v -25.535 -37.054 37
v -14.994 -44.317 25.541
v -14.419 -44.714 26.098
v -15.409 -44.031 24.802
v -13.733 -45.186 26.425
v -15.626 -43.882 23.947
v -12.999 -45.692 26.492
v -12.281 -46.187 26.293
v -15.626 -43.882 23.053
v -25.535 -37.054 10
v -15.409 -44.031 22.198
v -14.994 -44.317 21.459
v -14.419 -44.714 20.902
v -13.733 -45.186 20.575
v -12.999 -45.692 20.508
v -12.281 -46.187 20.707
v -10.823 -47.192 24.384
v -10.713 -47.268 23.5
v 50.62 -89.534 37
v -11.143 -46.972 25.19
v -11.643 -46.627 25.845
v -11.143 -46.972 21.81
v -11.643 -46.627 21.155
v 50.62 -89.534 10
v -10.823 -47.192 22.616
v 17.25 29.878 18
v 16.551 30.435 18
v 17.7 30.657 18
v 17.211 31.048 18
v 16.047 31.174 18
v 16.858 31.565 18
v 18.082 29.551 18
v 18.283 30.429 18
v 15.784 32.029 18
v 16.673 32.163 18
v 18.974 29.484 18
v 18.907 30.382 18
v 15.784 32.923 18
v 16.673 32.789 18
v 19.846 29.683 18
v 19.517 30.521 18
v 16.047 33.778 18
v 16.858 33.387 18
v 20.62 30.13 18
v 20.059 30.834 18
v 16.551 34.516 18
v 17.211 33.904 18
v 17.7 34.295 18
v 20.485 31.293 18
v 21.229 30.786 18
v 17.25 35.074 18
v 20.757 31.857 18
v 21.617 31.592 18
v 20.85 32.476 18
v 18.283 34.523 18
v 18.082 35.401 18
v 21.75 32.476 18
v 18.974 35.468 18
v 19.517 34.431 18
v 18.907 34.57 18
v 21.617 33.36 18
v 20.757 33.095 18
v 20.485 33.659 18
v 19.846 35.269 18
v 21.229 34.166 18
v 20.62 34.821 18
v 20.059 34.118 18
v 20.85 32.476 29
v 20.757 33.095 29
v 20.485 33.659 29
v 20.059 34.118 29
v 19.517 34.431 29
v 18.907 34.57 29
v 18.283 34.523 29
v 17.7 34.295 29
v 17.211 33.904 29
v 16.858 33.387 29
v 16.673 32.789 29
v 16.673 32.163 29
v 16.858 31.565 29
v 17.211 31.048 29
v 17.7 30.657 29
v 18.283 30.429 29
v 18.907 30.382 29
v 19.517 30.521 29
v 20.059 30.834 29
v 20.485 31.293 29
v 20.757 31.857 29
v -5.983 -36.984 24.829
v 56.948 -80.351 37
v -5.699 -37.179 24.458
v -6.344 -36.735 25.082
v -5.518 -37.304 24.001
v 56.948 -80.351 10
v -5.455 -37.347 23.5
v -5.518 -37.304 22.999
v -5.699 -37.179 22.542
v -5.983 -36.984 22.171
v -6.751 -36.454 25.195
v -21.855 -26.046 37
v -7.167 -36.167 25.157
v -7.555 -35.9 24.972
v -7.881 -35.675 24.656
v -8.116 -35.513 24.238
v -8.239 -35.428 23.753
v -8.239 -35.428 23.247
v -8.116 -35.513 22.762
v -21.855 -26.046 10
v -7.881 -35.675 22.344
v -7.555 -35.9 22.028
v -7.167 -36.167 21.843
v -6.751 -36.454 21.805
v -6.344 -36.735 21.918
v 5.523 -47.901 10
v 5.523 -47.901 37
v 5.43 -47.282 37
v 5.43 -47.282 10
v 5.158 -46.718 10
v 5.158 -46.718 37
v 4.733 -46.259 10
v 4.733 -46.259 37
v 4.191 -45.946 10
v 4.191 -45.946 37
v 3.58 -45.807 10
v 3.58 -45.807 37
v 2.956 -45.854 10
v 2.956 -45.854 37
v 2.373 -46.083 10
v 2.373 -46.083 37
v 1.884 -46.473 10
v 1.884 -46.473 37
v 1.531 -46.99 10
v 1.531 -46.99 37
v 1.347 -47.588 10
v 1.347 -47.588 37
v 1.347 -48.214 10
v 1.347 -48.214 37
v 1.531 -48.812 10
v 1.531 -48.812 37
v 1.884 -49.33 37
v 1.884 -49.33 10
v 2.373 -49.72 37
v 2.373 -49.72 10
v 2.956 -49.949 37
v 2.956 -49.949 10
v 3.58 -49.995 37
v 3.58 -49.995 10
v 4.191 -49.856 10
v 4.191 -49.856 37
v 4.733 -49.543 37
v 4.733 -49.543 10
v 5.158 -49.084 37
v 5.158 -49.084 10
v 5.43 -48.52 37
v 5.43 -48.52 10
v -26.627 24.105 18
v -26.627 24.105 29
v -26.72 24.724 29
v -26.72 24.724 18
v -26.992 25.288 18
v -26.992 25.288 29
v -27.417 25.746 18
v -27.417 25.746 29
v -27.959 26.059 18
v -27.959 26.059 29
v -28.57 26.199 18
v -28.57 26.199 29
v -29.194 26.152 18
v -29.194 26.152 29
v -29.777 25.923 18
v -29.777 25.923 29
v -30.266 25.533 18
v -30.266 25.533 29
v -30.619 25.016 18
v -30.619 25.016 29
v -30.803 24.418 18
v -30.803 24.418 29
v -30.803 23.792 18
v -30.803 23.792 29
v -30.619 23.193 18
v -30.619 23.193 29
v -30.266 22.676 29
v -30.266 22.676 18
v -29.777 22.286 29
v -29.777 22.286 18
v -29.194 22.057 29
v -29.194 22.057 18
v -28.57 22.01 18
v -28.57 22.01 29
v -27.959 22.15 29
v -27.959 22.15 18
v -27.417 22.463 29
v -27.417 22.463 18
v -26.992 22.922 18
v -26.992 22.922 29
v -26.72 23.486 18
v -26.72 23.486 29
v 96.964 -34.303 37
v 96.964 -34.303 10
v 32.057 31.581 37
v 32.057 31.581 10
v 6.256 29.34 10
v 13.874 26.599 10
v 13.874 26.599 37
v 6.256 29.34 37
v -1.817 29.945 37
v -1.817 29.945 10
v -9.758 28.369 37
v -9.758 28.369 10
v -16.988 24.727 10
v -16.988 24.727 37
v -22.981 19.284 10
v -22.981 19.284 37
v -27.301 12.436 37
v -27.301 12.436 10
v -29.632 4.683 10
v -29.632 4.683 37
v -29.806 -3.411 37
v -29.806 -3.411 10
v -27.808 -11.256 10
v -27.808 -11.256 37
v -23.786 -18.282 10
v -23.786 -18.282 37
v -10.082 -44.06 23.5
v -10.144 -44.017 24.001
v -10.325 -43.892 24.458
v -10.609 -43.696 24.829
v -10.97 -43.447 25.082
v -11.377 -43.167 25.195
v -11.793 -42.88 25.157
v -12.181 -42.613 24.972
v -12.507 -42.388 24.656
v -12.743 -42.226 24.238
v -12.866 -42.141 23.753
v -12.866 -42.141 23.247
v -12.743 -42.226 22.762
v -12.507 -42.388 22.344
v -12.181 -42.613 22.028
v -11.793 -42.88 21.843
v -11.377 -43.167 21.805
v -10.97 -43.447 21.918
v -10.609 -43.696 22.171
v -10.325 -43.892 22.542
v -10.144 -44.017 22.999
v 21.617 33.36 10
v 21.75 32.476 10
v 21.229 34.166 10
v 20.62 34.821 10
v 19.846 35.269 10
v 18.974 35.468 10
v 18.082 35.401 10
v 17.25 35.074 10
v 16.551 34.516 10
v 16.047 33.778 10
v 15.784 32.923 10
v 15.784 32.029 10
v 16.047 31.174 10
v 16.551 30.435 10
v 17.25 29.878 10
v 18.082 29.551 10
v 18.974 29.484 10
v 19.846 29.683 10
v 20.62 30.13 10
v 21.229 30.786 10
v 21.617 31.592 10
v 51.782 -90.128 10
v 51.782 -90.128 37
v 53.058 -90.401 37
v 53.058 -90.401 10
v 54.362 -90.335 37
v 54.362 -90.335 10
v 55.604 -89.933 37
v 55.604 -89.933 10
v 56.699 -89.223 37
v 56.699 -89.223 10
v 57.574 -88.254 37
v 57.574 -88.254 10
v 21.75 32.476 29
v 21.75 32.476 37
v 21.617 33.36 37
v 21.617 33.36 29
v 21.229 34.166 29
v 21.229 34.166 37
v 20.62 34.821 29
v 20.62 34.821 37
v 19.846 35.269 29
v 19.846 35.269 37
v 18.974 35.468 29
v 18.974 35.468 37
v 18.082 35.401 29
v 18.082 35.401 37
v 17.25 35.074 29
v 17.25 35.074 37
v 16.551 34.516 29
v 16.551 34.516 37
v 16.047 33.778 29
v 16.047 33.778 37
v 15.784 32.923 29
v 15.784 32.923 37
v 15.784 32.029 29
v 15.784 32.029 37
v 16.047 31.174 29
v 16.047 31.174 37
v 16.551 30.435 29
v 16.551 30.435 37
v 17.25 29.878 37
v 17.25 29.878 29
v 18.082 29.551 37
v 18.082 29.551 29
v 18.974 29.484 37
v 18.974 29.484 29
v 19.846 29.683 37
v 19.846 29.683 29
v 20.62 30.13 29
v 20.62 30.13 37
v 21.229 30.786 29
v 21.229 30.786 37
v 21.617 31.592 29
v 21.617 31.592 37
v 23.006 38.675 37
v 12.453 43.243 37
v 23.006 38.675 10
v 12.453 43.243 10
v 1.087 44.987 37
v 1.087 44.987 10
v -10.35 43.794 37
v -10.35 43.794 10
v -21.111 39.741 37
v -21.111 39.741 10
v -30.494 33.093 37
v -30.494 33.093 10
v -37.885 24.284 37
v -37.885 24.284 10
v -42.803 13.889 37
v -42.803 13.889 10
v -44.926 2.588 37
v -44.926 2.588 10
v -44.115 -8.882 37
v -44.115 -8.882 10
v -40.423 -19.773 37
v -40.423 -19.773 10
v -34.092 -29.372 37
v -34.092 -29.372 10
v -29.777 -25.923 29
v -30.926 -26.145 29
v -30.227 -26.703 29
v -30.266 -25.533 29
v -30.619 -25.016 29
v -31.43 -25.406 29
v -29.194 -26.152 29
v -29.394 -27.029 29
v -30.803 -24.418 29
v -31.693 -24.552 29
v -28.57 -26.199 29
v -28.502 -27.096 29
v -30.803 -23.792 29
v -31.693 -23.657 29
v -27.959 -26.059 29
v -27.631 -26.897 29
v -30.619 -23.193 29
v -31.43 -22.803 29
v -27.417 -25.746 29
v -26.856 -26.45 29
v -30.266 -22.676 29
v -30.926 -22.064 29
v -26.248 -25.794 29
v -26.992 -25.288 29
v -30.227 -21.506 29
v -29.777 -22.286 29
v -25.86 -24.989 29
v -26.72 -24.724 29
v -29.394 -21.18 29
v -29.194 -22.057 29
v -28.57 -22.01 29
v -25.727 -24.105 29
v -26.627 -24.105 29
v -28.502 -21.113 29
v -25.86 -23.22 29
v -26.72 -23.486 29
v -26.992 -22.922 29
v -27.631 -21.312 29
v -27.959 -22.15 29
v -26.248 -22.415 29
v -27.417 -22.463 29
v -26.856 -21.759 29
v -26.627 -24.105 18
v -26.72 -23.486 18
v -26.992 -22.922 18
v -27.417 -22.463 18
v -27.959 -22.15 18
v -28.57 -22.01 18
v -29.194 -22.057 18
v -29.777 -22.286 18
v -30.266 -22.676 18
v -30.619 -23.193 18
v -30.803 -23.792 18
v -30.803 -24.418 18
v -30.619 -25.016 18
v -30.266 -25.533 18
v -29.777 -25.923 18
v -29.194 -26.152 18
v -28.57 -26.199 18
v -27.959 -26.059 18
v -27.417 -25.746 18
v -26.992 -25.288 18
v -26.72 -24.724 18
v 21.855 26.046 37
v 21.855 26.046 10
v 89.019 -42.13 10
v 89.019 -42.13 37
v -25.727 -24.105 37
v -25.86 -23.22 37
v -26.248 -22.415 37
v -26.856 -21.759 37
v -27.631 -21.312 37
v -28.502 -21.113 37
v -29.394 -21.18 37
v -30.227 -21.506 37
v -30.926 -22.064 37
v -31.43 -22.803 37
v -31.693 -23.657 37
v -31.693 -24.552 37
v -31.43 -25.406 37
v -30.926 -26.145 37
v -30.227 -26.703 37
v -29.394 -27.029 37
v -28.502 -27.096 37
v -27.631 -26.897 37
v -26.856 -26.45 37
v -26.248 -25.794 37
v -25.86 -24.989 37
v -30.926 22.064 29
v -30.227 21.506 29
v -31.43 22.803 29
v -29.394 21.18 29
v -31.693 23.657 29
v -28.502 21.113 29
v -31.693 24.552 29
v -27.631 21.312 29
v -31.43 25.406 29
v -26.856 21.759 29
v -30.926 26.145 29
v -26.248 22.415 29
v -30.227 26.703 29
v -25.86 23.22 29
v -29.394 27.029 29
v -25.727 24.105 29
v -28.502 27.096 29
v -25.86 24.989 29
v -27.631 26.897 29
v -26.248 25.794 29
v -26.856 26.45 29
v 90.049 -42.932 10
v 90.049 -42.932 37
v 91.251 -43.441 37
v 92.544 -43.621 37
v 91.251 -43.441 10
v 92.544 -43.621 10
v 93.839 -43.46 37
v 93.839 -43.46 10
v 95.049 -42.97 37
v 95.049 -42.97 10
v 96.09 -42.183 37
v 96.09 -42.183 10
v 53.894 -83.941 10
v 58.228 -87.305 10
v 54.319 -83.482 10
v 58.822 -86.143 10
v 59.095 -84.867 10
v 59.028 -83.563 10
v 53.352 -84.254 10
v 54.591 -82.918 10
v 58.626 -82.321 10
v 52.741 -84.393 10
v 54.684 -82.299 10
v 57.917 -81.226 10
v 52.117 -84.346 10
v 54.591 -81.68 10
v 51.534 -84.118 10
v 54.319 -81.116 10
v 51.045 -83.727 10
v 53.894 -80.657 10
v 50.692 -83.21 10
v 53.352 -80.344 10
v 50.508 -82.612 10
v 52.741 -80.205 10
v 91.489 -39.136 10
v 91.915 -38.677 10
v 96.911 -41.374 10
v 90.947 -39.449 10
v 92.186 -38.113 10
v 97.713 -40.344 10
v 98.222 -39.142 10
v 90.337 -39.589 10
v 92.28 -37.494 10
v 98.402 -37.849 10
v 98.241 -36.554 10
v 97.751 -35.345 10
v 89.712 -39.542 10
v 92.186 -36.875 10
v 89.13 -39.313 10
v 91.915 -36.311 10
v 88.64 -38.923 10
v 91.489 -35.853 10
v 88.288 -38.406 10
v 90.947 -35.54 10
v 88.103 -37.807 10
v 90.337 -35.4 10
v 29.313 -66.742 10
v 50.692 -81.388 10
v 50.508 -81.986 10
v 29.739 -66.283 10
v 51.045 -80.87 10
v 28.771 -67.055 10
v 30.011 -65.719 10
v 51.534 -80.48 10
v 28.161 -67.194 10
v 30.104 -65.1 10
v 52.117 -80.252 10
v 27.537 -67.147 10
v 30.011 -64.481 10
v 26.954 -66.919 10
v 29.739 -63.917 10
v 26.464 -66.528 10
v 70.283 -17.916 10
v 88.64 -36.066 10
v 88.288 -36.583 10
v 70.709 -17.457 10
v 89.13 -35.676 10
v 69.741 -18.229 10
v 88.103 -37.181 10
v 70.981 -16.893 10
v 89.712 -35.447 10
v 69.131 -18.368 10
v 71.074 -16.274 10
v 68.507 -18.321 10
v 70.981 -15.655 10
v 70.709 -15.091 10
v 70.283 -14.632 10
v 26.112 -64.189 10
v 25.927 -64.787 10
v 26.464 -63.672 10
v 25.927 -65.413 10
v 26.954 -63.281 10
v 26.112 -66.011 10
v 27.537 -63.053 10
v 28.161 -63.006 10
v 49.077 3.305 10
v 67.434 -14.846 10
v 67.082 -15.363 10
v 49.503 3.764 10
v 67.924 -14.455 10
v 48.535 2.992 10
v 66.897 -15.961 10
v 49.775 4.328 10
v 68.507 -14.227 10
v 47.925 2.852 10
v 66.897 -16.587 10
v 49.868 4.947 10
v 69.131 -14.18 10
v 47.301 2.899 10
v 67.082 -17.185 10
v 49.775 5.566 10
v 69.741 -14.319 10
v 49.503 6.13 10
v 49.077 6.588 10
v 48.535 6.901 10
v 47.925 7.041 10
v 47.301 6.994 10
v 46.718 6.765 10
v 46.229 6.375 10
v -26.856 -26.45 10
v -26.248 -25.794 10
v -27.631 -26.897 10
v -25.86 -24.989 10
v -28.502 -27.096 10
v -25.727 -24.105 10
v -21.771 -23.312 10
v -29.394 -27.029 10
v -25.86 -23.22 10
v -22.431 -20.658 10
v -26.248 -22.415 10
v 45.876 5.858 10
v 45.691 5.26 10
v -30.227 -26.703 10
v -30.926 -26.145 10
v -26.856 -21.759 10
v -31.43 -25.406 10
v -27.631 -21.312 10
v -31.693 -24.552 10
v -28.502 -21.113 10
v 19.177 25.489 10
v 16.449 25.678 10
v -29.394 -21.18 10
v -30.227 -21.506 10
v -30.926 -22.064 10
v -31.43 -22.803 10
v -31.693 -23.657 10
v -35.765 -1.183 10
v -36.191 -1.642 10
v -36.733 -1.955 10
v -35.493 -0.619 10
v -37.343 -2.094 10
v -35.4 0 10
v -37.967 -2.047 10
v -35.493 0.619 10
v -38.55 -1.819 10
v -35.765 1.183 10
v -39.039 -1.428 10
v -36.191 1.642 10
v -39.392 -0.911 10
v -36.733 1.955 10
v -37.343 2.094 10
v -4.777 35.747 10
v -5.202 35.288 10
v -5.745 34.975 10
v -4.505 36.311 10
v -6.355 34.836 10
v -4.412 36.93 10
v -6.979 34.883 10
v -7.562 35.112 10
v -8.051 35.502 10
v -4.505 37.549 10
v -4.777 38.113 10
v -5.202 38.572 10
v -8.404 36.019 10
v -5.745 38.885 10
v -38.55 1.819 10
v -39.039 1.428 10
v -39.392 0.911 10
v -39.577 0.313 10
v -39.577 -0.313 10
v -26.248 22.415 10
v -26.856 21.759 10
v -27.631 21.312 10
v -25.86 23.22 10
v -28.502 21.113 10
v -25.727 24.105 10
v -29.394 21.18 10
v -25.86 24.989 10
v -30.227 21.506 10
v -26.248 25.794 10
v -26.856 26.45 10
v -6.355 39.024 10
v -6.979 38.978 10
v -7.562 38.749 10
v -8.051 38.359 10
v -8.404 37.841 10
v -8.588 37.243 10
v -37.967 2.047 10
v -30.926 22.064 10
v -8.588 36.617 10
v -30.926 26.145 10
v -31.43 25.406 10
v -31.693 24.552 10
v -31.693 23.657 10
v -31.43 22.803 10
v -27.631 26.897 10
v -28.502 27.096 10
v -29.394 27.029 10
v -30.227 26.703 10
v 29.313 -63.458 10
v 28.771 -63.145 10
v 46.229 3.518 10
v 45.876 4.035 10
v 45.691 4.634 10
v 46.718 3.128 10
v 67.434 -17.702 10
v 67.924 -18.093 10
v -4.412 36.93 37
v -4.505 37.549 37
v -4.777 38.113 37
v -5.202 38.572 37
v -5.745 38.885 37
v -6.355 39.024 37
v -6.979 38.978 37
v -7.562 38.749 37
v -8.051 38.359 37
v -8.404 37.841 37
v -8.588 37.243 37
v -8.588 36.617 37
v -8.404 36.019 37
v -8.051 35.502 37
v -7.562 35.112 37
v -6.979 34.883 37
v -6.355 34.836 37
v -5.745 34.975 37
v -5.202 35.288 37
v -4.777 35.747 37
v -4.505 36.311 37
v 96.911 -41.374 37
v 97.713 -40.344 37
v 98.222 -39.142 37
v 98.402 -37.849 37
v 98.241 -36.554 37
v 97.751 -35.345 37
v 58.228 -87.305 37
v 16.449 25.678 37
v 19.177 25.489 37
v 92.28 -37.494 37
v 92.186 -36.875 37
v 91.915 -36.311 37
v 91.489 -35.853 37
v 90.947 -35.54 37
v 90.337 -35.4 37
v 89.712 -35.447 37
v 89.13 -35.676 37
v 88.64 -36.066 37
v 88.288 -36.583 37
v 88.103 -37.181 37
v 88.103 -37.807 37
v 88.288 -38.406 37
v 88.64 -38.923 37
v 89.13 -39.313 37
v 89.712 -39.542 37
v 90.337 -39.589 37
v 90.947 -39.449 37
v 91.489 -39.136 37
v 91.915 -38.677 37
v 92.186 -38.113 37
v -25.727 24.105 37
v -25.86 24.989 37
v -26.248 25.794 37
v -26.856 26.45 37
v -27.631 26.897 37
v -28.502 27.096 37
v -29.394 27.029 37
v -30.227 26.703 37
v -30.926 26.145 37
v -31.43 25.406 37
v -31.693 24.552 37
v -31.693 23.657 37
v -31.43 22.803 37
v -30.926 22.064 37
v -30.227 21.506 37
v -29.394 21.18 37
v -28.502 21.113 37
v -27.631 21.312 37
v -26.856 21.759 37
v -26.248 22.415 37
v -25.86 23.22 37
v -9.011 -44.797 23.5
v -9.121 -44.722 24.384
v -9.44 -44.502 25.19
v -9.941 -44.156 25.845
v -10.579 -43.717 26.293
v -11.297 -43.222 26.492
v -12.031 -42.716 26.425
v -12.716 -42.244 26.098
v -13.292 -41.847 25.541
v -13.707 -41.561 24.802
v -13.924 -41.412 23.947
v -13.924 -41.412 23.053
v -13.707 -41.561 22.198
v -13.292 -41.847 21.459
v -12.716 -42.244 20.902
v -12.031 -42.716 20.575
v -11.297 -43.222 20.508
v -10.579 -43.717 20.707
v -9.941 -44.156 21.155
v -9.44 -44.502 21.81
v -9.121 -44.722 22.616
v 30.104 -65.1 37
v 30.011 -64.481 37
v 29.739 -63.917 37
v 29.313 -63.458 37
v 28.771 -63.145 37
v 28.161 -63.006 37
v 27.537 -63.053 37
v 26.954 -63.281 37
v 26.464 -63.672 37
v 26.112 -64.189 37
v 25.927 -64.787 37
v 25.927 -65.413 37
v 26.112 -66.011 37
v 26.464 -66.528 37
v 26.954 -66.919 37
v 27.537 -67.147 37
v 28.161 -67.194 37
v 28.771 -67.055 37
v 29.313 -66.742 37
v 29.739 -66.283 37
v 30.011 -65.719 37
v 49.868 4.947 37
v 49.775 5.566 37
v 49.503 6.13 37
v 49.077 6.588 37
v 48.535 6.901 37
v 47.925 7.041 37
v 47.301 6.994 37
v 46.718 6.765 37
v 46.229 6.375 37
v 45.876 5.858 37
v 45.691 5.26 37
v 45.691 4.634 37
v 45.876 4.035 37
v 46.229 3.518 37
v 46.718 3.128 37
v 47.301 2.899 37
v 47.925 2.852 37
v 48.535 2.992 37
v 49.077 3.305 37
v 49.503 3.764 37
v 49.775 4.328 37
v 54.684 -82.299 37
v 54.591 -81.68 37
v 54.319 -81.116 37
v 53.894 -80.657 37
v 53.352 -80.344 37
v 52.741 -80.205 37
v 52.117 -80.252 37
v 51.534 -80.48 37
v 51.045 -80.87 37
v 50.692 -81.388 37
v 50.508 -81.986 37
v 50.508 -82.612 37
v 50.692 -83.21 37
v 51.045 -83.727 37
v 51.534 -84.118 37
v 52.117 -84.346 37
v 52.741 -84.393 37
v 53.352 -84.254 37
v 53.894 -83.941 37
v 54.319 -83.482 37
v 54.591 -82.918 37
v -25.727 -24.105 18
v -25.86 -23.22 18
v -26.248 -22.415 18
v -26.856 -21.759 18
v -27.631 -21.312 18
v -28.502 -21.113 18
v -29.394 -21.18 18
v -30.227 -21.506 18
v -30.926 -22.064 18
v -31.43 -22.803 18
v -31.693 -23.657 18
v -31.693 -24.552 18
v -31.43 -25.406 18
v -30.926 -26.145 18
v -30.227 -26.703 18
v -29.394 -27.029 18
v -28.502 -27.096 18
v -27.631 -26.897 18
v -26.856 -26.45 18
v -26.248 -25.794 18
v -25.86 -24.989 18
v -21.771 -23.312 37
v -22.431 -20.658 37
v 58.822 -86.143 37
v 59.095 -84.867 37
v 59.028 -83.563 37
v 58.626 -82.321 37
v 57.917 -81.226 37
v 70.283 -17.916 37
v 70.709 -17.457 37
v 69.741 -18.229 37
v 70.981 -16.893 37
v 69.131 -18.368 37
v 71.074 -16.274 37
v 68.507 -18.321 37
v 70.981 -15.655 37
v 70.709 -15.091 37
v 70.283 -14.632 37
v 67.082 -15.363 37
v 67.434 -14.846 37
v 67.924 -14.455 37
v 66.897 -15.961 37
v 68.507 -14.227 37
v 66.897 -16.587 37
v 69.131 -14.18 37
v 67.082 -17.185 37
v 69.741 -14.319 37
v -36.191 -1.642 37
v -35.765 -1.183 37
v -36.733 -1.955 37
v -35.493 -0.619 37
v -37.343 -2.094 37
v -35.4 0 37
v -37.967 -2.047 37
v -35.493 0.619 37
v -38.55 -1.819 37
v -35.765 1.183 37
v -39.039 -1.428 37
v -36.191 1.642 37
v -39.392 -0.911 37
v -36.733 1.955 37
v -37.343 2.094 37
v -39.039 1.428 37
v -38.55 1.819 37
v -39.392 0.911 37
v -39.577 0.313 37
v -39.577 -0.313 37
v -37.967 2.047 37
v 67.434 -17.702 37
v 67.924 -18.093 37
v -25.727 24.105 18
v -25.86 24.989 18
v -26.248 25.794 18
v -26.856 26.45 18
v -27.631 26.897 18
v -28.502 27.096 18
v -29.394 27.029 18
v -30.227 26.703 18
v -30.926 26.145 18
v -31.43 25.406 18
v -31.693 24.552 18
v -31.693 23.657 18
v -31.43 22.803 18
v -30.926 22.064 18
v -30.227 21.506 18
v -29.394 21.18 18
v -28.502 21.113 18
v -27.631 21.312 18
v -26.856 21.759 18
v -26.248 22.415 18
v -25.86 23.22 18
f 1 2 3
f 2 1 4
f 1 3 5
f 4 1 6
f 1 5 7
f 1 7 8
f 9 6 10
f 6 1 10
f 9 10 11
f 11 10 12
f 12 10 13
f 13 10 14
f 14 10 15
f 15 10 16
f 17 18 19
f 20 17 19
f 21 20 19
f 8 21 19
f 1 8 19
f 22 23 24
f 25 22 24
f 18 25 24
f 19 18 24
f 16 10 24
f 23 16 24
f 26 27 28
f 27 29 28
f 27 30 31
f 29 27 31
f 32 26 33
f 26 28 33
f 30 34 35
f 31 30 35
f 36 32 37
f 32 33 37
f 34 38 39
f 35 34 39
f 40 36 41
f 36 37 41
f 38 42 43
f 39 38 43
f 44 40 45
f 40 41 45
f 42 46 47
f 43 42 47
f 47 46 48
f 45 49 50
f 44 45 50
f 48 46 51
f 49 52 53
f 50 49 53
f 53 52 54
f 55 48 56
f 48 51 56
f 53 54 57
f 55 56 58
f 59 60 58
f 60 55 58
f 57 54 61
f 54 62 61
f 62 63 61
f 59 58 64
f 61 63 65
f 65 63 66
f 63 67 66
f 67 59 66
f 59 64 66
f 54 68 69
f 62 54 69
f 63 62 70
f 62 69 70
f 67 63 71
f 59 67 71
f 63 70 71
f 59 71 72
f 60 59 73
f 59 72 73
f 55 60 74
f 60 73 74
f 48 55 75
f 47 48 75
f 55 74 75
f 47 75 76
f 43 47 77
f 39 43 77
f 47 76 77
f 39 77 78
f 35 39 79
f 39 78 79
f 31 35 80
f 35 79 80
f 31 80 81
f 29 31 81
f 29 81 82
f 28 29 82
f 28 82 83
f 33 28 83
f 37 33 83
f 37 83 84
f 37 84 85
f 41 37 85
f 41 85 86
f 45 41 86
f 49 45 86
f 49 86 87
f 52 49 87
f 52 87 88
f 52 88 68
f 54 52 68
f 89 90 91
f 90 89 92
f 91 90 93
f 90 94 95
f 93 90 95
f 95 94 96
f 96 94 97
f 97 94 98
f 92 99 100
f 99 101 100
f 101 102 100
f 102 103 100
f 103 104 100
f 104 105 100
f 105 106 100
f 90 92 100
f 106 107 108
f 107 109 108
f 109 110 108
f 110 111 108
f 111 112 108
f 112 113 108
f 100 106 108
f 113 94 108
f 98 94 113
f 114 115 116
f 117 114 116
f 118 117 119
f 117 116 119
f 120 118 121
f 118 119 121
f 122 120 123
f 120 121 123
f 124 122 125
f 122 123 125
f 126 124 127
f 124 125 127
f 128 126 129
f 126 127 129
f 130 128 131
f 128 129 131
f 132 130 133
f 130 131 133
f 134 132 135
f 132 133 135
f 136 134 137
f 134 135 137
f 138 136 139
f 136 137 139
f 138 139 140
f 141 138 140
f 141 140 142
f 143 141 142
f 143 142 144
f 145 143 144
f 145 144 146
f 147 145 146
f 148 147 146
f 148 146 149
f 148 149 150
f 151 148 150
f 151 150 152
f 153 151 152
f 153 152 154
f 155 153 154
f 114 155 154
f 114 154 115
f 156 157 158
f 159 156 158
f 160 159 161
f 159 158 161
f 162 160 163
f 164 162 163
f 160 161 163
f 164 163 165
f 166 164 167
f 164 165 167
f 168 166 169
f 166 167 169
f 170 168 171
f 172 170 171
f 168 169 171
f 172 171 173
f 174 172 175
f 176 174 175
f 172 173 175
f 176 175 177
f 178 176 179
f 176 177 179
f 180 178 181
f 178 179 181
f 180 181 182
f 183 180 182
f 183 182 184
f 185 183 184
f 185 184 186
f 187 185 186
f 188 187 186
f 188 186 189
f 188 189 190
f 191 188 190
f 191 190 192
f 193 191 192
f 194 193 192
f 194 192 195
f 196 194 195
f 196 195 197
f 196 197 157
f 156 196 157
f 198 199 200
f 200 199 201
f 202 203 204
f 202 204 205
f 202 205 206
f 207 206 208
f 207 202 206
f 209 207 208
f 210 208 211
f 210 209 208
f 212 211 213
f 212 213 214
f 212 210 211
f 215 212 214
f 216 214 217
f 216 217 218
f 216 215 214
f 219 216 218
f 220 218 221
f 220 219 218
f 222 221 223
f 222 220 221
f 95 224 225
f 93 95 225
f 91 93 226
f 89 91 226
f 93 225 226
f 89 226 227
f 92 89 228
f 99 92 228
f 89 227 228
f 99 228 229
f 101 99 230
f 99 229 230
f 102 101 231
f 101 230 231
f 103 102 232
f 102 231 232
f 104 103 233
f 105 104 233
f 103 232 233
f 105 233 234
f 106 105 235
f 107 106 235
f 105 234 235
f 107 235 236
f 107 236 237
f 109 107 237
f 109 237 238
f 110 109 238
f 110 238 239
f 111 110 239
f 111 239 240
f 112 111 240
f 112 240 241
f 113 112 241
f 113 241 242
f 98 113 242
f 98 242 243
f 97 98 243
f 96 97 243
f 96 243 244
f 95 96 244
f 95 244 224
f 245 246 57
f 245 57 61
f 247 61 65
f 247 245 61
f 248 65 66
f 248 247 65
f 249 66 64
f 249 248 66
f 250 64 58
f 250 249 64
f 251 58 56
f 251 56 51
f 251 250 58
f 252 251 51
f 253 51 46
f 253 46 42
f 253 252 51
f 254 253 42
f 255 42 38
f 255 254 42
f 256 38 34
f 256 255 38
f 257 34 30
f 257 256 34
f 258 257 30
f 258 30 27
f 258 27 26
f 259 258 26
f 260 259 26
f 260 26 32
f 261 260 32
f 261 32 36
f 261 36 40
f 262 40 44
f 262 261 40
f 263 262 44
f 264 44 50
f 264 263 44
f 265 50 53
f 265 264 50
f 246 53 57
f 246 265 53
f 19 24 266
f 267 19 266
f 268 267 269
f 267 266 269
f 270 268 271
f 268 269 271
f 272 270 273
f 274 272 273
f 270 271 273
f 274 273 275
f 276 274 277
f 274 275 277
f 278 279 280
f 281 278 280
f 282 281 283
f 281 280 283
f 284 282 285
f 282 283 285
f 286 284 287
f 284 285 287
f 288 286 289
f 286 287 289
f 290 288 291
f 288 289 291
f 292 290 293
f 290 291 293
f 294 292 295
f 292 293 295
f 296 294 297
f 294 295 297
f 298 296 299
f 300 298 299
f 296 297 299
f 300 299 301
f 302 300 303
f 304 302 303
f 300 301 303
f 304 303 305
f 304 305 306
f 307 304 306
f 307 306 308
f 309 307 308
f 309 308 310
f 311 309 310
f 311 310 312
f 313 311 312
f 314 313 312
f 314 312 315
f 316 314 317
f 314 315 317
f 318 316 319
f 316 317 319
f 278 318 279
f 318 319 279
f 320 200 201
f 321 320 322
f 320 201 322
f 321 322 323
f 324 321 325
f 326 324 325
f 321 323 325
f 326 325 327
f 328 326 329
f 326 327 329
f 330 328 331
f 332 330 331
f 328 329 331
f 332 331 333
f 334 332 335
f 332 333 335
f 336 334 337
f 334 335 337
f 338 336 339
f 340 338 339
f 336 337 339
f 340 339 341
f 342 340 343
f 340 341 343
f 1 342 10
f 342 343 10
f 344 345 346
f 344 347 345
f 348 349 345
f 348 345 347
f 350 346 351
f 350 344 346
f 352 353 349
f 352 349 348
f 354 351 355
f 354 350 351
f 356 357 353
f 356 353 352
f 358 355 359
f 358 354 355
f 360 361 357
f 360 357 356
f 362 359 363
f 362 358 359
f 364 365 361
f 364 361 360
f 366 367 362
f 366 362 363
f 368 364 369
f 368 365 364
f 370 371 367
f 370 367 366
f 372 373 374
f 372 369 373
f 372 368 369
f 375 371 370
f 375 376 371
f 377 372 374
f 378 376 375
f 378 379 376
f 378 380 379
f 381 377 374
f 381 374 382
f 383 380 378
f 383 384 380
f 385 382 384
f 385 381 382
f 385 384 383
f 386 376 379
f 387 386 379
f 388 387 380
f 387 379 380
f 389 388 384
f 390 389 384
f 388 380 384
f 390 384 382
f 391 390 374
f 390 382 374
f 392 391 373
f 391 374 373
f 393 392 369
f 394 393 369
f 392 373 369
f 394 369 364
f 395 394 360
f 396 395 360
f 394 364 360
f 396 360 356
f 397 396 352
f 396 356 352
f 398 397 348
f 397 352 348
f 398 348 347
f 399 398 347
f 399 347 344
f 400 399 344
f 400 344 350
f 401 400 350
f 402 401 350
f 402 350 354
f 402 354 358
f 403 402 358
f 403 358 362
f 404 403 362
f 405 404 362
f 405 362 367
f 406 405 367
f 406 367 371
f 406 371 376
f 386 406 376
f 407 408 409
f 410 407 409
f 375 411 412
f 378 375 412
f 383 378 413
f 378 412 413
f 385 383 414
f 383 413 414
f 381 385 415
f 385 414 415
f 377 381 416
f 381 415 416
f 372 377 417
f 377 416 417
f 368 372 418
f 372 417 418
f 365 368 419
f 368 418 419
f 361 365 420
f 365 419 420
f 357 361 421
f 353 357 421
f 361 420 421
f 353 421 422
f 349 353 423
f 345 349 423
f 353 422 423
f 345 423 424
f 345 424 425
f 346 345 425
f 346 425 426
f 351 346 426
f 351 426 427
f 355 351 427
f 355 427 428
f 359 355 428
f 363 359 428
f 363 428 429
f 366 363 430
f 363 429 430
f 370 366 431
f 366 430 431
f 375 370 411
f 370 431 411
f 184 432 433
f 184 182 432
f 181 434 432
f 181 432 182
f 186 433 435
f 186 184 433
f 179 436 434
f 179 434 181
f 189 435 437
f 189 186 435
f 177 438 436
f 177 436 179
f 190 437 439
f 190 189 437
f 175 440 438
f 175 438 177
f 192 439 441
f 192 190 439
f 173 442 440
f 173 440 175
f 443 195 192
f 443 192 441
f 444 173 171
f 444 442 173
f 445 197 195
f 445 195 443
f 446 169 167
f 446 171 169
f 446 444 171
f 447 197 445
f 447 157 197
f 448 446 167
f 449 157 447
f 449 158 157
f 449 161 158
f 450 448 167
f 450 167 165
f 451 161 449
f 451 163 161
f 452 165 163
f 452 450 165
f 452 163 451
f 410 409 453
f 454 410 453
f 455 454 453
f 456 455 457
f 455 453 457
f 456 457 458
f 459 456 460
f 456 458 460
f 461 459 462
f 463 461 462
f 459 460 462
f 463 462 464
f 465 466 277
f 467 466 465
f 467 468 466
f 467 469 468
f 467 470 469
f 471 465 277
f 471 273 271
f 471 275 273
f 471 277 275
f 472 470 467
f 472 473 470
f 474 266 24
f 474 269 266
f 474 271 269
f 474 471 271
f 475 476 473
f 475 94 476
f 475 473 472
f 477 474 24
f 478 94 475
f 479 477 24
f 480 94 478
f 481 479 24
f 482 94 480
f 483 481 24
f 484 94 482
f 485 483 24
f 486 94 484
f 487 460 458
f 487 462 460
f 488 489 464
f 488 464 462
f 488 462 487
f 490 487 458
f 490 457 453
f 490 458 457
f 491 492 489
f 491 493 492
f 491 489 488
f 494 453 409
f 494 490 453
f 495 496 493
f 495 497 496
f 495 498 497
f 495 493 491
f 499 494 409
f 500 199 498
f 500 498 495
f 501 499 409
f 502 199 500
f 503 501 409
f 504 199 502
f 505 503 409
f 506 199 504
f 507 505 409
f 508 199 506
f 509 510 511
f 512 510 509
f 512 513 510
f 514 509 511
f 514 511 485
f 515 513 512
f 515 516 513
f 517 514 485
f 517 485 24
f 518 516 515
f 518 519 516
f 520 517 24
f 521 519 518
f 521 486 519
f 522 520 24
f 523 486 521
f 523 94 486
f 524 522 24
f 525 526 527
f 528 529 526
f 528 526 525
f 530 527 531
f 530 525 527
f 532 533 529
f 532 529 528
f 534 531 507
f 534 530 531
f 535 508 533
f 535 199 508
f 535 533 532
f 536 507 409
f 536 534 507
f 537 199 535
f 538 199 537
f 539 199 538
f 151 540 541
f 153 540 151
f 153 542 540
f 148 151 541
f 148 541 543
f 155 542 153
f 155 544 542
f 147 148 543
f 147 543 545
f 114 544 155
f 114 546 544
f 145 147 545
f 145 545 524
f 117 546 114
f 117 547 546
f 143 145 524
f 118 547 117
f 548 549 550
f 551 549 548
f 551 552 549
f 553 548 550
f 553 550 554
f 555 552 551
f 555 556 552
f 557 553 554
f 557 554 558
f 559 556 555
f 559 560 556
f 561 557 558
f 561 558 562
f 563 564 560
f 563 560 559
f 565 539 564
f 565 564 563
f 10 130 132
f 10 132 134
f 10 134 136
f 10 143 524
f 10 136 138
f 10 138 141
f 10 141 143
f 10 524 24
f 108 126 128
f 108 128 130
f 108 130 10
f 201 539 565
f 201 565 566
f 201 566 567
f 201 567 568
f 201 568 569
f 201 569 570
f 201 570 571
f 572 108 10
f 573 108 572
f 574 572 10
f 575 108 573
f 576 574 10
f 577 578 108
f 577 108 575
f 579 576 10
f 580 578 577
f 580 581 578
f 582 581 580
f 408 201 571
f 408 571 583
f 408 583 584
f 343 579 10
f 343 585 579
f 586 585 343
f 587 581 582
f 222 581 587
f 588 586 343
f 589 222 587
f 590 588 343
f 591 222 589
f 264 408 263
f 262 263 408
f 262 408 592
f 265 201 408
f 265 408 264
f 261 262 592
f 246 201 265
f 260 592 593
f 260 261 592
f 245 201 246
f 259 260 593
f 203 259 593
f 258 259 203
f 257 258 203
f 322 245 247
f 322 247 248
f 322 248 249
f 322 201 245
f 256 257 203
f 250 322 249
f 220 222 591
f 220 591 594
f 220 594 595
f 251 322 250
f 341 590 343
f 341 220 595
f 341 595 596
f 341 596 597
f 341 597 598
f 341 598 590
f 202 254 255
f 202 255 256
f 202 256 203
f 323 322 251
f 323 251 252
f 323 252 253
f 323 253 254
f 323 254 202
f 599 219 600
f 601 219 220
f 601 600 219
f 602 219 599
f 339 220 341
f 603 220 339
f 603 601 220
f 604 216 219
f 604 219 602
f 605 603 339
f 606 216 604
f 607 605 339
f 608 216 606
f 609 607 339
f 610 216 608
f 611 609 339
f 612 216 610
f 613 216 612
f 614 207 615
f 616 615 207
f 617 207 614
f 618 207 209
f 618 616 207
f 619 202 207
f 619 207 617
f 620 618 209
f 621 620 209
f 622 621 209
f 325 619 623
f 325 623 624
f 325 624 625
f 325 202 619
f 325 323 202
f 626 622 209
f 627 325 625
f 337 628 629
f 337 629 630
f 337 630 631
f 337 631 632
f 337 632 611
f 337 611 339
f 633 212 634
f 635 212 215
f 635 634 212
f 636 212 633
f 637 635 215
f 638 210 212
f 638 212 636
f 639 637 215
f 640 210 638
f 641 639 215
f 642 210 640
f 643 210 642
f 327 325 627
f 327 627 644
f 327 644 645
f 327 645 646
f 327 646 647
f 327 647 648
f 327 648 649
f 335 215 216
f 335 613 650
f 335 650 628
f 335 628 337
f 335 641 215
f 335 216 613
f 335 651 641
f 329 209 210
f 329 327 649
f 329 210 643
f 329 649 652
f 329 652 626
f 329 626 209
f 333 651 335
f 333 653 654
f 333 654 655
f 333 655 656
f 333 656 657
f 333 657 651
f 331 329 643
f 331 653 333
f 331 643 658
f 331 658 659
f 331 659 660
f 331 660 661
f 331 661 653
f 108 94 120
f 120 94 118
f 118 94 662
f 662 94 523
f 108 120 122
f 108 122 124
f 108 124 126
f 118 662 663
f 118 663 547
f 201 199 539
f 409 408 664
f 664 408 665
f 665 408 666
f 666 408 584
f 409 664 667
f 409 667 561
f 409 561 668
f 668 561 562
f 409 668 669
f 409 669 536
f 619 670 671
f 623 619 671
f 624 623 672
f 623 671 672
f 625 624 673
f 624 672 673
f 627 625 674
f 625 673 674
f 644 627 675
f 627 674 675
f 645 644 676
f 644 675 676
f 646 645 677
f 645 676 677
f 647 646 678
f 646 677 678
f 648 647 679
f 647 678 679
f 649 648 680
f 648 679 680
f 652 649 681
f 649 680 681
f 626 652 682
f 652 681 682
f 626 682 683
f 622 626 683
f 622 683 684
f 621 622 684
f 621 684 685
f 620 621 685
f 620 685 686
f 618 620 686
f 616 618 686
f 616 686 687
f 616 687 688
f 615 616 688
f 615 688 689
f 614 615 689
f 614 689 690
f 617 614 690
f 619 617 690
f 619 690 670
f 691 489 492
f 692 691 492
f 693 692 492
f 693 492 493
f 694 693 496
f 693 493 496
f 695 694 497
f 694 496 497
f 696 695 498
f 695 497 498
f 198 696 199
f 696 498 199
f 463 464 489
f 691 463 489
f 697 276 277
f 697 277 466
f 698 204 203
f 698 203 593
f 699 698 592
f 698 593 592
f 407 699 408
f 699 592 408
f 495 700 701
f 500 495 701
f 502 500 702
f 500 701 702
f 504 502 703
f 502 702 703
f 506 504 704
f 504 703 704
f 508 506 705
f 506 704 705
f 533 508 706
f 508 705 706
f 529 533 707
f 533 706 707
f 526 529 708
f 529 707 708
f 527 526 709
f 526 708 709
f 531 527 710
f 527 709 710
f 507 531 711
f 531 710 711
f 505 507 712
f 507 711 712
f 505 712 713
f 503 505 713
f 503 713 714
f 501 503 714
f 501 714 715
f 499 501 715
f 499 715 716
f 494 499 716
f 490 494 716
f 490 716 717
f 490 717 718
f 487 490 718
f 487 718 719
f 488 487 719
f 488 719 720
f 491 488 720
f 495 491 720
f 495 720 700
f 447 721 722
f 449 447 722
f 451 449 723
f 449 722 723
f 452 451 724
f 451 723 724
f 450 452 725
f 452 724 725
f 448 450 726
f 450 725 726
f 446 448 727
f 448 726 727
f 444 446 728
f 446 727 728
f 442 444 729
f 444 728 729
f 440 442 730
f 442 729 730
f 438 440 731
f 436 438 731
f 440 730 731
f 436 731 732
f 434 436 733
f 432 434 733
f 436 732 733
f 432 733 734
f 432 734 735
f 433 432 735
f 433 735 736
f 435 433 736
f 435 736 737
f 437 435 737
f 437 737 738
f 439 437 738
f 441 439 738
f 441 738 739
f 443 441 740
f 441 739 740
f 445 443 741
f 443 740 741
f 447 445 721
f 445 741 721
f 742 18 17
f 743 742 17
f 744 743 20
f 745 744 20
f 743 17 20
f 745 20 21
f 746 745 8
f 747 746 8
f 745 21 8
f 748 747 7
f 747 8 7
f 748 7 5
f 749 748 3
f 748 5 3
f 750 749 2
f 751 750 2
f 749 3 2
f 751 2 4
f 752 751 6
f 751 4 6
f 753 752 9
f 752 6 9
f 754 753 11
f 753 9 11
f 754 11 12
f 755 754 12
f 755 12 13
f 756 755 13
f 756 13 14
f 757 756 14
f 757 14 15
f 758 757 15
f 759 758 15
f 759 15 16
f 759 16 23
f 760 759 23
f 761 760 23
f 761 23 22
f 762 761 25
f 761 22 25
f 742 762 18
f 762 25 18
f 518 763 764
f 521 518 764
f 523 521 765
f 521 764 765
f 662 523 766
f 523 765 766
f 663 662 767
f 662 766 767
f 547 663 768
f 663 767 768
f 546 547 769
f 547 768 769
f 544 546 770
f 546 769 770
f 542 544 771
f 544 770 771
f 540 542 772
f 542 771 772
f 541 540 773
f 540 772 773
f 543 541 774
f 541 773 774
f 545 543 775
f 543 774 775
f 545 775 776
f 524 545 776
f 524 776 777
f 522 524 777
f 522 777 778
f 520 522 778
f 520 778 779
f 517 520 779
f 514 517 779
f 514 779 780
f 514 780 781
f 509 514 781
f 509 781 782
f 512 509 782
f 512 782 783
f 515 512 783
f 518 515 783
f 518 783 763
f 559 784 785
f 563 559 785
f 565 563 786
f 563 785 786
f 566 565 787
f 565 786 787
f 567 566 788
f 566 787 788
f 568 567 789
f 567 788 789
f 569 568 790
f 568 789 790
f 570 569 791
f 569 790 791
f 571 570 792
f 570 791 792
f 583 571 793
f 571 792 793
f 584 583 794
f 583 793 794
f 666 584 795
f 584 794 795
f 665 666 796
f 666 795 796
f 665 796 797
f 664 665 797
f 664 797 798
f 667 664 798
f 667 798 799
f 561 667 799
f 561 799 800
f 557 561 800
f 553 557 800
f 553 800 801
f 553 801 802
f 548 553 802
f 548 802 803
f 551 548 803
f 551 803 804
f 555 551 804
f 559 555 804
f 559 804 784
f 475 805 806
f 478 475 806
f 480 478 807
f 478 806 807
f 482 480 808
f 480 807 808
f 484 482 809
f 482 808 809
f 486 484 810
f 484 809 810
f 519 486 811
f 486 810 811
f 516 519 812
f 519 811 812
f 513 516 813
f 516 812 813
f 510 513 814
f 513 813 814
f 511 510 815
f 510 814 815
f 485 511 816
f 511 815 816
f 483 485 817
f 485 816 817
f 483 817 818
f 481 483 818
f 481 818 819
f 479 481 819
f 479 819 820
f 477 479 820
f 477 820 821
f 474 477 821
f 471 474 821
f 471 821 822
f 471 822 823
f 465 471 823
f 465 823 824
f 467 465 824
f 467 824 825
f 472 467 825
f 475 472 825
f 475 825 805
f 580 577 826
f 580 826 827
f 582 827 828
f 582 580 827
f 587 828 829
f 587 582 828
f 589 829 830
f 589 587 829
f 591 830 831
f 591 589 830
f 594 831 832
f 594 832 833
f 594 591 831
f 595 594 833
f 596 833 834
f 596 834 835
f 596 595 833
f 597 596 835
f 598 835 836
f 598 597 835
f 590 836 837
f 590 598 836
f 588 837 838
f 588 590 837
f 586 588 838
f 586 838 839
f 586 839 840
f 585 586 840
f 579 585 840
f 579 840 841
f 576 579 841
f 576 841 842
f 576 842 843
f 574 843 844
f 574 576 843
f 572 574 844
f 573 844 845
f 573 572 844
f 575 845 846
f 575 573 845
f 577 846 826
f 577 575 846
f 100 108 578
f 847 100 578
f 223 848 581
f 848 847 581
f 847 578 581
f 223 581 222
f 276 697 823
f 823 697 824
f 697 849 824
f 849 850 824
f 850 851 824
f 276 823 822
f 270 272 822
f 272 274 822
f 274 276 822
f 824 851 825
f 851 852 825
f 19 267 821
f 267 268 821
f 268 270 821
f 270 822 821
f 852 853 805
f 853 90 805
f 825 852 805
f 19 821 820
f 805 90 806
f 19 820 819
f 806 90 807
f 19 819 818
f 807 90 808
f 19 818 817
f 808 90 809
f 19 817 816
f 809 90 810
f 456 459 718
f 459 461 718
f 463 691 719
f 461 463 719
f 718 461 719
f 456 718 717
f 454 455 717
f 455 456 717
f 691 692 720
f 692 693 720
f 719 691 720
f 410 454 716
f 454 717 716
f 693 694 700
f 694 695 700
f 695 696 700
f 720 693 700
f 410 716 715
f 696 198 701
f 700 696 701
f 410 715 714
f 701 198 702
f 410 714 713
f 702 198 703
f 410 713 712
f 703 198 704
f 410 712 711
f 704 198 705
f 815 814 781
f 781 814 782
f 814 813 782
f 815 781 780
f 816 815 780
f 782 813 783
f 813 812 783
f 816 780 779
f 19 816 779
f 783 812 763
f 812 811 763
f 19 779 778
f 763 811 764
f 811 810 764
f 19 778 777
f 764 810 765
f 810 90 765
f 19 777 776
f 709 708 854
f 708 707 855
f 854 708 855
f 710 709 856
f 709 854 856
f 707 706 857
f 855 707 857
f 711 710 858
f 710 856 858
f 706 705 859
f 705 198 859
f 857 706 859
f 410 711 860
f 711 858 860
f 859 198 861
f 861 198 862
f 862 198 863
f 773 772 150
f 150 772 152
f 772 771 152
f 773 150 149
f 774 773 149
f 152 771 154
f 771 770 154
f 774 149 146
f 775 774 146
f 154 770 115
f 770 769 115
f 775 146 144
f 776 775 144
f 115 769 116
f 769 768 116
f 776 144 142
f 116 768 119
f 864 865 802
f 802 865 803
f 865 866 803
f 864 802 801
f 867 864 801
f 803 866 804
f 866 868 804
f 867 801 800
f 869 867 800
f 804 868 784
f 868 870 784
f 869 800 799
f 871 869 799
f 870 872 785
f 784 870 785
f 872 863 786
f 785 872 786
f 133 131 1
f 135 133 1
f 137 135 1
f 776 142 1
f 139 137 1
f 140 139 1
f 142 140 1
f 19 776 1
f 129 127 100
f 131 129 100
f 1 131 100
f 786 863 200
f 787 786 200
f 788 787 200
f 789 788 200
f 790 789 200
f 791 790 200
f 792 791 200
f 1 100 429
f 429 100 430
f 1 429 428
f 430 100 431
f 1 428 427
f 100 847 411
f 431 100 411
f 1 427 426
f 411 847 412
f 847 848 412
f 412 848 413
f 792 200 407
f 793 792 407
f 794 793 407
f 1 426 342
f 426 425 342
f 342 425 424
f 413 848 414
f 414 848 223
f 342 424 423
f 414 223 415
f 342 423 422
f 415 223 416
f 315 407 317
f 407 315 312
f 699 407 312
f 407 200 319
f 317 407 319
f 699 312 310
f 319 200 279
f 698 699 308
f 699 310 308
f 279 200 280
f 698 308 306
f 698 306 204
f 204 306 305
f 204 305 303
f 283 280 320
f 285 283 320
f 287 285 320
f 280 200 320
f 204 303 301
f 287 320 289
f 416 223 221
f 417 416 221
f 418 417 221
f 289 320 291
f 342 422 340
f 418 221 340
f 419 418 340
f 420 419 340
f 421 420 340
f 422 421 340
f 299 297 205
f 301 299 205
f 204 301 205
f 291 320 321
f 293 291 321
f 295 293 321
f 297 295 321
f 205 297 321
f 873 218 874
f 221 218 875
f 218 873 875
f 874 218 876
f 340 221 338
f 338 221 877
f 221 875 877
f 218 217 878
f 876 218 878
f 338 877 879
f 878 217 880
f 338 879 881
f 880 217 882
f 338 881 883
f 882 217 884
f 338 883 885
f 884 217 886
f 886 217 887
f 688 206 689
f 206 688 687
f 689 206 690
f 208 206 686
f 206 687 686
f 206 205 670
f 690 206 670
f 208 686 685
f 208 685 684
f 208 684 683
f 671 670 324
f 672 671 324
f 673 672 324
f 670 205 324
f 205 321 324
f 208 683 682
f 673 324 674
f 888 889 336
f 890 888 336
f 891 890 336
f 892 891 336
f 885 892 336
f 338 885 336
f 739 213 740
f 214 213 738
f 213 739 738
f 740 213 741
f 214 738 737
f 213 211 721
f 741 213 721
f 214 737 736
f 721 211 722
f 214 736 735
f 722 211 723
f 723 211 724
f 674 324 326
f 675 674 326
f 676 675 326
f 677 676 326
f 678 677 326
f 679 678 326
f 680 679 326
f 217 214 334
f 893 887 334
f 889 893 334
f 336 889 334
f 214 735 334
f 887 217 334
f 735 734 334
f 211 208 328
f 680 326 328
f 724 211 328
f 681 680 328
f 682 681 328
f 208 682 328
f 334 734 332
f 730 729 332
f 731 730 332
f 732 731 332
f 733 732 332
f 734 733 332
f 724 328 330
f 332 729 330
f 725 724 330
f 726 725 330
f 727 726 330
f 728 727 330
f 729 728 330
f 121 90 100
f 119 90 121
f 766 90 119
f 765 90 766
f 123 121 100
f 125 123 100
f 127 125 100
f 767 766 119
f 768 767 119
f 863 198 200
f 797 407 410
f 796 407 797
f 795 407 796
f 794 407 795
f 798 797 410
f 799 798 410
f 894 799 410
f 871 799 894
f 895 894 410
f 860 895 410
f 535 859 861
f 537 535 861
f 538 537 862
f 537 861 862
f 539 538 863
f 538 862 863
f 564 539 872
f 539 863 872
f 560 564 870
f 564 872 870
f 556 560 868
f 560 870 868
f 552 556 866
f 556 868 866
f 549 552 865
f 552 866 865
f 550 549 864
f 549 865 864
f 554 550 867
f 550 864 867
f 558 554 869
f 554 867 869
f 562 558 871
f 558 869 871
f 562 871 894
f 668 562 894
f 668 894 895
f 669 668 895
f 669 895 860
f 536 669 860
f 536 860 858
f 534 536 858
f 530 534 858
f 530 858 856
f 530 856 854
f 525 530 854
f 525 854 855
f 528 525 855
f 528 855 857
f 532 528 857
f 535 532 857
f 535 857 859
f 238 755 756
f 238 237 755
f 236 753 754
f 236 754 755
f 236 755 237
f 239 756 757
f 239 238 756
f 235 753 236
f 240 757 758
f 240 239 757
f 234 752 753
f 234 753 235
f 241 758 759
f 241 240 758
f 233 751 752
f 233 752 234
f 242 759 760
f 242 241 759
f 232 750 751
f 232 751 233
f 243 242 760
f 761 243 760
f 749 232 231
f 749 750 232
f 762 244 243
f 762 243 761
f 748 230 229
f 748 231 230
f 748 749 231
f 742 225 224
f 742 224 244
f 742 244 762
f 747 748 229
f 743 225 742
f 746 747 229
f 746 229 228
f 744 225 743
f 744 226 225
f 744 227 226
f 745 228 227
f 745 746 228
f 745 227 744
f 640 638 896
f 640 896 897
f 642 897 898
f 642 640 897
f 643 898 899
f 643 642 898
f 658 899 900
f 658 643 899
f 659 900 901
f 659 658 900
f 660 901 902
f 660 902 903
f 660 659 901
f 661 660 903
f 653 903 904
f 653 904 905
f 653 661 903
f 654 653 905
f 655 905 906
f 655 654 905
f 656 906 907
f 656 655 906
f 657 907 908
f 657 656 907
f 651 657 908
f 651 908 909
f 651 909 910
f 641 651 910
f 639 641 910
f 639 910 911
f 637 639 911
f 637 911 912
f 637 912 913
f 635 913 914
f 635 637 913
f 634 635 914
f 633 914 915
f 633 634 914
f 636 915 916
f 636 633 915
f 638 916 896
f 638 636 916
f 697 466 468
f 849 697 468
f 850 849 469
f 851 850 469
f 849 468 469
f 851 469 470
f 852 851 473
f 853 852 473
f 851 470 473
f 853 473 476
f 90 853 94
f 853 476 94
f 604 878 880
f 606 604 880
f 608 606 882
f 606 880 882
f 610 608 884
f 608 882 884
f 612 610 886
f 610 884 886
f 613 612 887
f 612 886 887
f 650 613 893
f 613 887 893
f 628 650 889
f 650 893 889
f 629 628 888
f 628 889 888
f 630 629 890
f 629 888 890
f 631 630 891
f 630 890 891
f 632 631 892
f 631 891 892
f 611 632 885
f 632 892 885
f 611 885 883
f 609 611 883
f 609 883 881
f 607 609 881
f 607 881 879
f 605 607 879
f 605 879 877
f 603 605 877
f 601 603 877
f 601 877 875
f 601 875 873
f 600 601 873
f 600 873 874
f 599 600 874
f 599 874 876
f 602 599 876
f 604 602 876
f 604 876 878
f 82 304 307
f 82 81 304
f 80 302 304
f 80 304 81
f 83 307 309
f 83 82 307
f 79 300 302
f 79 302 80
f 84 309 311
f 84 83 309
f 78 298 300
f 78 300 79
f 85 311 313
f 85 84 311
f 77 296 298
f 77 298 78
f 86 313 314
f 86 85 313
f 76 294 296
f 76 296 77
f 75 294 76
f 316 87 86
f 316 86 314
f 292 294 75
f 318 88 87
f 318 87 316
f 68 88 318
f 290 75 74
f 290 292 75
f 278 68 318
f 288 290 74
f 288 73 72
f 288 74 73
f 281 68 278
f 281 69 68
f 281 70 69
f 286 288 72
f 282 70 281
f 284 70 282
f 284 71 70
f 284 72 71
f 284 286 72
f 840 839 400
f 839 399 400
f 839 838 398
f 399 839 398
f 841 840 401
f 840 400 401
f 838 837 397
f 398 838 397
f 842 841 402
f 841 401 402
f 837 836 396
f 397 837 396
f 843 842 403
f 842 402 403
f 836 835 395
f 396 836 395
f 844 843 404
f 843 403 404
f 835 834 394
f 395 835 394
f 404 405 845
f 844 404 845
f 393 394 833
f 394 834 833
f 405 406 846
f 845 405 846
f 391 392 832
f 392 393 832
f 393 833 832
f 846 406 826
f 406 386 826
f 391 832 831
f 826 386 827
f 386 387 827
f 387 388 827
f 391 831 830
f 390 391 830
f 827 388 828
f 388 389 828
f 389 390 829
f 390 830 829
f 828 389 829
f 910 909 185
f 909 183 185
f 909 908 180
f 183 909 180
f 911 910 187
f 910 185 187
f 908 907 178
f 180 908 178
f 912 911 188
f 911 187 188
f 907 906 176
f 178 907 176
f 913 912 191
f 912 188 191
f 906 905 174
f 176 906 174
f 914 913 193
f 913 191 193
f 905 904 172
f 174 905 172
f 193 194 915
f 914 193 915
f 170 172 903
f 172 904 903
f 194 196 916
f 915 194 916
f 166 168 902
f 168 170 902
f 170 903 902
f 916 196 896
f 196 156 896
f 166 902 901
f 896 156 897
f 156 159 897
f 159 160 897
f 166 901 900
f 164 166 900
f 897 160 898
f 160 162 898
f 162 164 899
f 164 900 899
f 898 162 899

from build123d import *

# Parameters (mm, degrees)
SKETCH1_R           = 1.6
BOSS_EXTRUDE1_DEPTH = 27
CUT_EXTRUDE1_REACH  = 138.335
SKETCH2_R           = 2.1
CUT_EXTRUDE2_REACH  = 155.174
SKETCH3_R           = 1.7
SKETCH3_3_R         = 3
SKETCH3_3_R_2       = 1.7
CUT_EXTRUDE3_DEPTH  = 3
SKETCH4_R           = 3
CUT_EXTRUDE4_DEPTH  = 8
BOSS_EXTRUDE2_START = -27
BOSS_EXTRUDE2_DEPTH = 27
FILLET1_R           = 10


with BuildPart() as part:
    # Sketch1 → Boss-Extrude1 (new body)
    with BuildSketch(Plane.XY.offset(10)):
        with BuildLine():
            Line((-25.534872354, -37.053613776), (50.619597549, -89.534180987))
            ThreePointArc((50.619597549, -89.534180987), (54.361803385, -90.334528675), (57.573873786, -88.254320829))
            Line((57.573873786, -88.254320829), (58.227827632, -87.305369414))
            ThreePointArc((58.227827632, -87.305369414), (59.02817532, -83.563163578), (56.947967474, -80.351093178))
            Line((56.947967474, -80.351093178), (-21.854778729, -26.045511066))
            ThreePointArc((-21.854778729, -26.045511066), (-26.045511066, 21.854778729), (21.854778729, 26.045511066))
            Line((21.854778729, 26.045511066), (89.019290298, -42.129978983))
            ThreePointArc((89.019290298, -42.129978983), (92.543786433, -43.620813626), (96.090160837, -42.182797794))
            Line((96.090160837, -42.182797794), (96.911137653, -41.373995292))
            ThreePointArc((96.911137653, -41.373995292), (98.401972296, -37.849499157), (96.963956464, -34.303124754))
            Line((96.963956464, -34.303124754), (32.056602073, 31.581232775))
            ThreePointArc((32.056602073, 31.581232775), (-34.47199994, 28.925442436), (-25.534872354, -37.053613776))
        make_face()
        with Locations((90.17973297, -37.494440018)):
            Circle(SKETCH1_R, mode=Mode.SUBTRACT)
        with Locations((68.973861607, -16.273907044)):
            Circle(SKETCH1_R, mode=Mode.SUBTRACT)
        with Locations((47.767990244, 4.946625931)):
            Circle(SKETCH1_R, mode=Mode.SUBTRACT)
        with Locations((18.75, 32.475952642)):
            Circle(SKETCH1_R, mode=Mode.SUBTRACT)
        with Locations((-6.511806663, 36.930290738)):
            Circle(SKETCH1_R, mode=Mode.SUBTRACT)
        with Locations((-28.726666617, 24.104535363)):
            Circle(SKETCH1_R, mode=Mode.SUBTRACT)
        with Locations((-37.5, 0)):
            Circle(SKETCH1_R, mode=Mode.SUBTRACT)
        with Locations((-28.726666617, -24.104535363)):
            Circle(SKETCH1_R, mode=Mode.SUBTRACT)
        with Locations((3.423348889, -47.901259716)):
            Circle(SKETCH1_R, mode=Mode.SUBTRACT)
        with Locations((28.003855203, -65.100059364)):
            Circle(SKETCH1_R, mode=Mode.SUBTRACT)
        with Locations((52.584361518, -82.298859012)):
            Circle(SKETCH1_R, mode=Mode.SUBTRACT)
    extrude(amount=BOSS_EXTRUDE1_DEPTH)

    # Sketch2 → Cut-Extrude1 (cut, up to next)
    with BuildSketch(Plane.XY.offset(37), mode=Mode.PRIVATE) as cut_extrude1_sk1:
        with Locations((52.584361518, -82.298859012)):
            Circle(SKETCH2_R)
    cut_extrude1_tool1 = extrude(cut_extrude1_sk1.sketch, amount=-CUT_EXTRUDE1_REACH, mode=Mode.PRIVATE) & part.part
    # Sketch2 → Cut-Extrude1 (cut, up to next)
    with BuildSketch(Plane.XY.offset(37), mode=Mode.PRIVATE) as cut_extrude1_sk2:
        with Locations((28.003855203, -65.100059364)):
            Circle(SKETCH2_R)
    cut_extrude1_tool2 = extrude(cut_extrude1_sk2.sketch, amount=-CUT_EXTRUDE1_REACH, mode=Mode.PRIVATE) & part.part
    # Sketch2 → Cut-Extrude1 (cut, up to next)
    with BuildSketch(Plane.XY.offset(37), mode=Mode.PRIVATE) as cut_extrude1_sk3:
        with Locations((3.423348889, -47.901259716)):
            Circle(SKETCH2_R)
    cut_extrude1_tool3 = extrude(cut_extrude1_sk3.sketch, amount=-CUT_EXTRUDE1_REACH, mode=Mode.PRIVATE) & part.part
    # Sketch2 → Cut-Extrude1 (cut, up to next)
    with BuildSketch(Plane.XY.offset(37), mode=Mode.PRIVATE) as cut_extrude1_sk4:
        with Locations((-28.726666617, -24.104535363)):
            Circle(SKETCH2_R)
    cut_extrude1_tool4 = extrude(cut_extrude1_sk4.sketch, amount=-CUT_EXTRUDE1_REACH, mode=Mode.PRIVATE) & part.part
    # Sketch2 → Cut-Extrude1 (cut, up to next)
    with BuildSketch(Plane.XY.offset(37), mode=Mode.PRIVATE) as cut_extrude1_sk5:
        with Locations((-37.5, 0)):
            Circle(SKETCH2_R)
    cut_extrude1_tool5 = extrude(cut_extrude1_sk5.sketch, amount=-CUT_EXTRUDE1_REACH, mode=Mode.PRIVATE) & part.part
    # Sketch2 → Cut-Extrude1 (cut, up to next)
    with BuildSketch(Plane.XY.offset(37), mode=Mode.PRIVATE) as cut_extrude1_sk6:
        with Locations((-28.726666617, 24.104535363)):
            Circle(SKETCH2_R)
    cut_extrude1_tool6 = extrude(cut_extrude1_sk6.sketch, amount=-CUT_EXTRUDE1_REACH, mode=Mode.PRIVATE) & part.part
    # Sketch2 → Cut-Extrude1 (cut, up to next)
    with BuildSketch(Plane.XY.offset(37), mode=Mode.PRIVATE) as cut_extrude1_sk7:
        with Locations((-6.511806663, 36.930290738)):
            Circle(SKETCH2_R)
    cut_extrude1_tool7 = extrude(cut_extrude1_sk7.sketch, amount=-CUT_EXTRUDE1_REACH, mode=Mode.PRIVATE) & part.part
    # Sketch2 → Cut-Extrude1 (cut, up to next)
    with BuildSketch(Plane.XY.offset(37), mode=Mode.PRIVATE) as cut_extrude1_sk8:
        with Locations((18.75, 32.475952642)):
            Circle(SKETCH2_R)
    cut_extrude1_tool8 = extrude(cut_extrude1_sk8.sketch, amount=-CUT_EXTRUDE1_REACH, mode=Mode.PRIVATE) & part.part
    # Sketch2 → Cut-Extrude1 (cut, up to next)
    with BuildSketch(Plane.XY.offset(37), mode=Mode.PRIVATE) as cut_extrude1_sk9:
        with Locations((47.767990244, 4.946625931)):
            Circle(SKETCH2_R)
    cut_extrude1_tool9 = extrude(cut_extrude1_sk9.sketch, amount=-CUT_EXTRUDE1_REACH, mode=Mode.PRIVATE) & part.part
    # Sketch2 → Cut-Extrude1 (cut, up to next)
    with BuildSketch(Plane.XY.offset(37), mode=Mode.PRIVATE) as cut_extrude1_sk10:
        with Locations((68.973861607, -16.273907044)):
            Circle(SKETCH2_R)
    cut_extrude1_tool10 = extrude(cut_extrude1_sk10.sketch, amount=-CUT_EXTRUDE1_REACH, mode=Mode.PRIVATE) & part.part
    # Sketch2 → Cut-Extrude1 (cut, up to next)
    with BuildSketch(Plane.XY.offset(37), mode=Mode.PRIVATE) as cut_extrude1_sk11:
        with Locations((90.17973297, -37.494440018)):
            Circle(SKETCH2_R)
    cut_extrude1_tool11 = extrude(cut_extrude1_sk11.sketch, amount=-CUT_EXTRUDE1_REACH, mode=Mode.PRIVATE) & part.part
    add(cut_extrude1_tool1.solids().sort_by_distance((52.584362, -82.298859, 37))[0], mode=Mode.SUBTRACT)
    add(cut_extrude1_tool2.solids().sort_by_distance((28.003855, -65.100059, 37))[0], mode=Mode.SUBTRACT)
    add(cut_extrude1_tool3.solids().sort_by_distance((3.423349, -47.90126, 37))[0], mode=Mode.SUBTRACT)
    add(cut_extrude1_tool4.solids().sort_by_distance((-28.726667, -24.104535, 37))[0], mode=Mode.SUBTRACT)
    add(cut_extrude1_tool5.solids().sort_by_distance((-37.5, 0, 37))[0], mode=Mode.SUBTRACT)
    add(cut_extrude1_tool6.solids().sort_by_distance((-28.726667, 24.104535, 37))[0], mode=Mode.SUBTRACT)
    add(cut_extrude1_tool7.solids().sort_by_distance((-6.511807, 36.930291, 37))[0], mode=Mode.SUBTRACT)
    add(cut_extrude1_tool8.solids().sort_by_distance((18.75, 32.475953, 37))[0], mode=Mode.SUBTRACT)
    add(cut_extrude1_tool9.solids().sort_by_distance((47.76799, 4.946626, 37))[0], mode=Mode.SUBTRACT)
    add(cut_extrude1_tool10.solids().sort_by_distance((68.973862, -16.273907, 37))[0], mode=Mode.SUBTRACT)
    add(cut_extrude1_tool11.solids().sort_by_distance((90.179733, -37.49444, 37))[0], mode=Mode.SUBTRACT)

    # Sketch3 → Cut-Extrude2 (cut, up to next)
    with BuildSketch(Plane(origin=(-25.534872354, -37.053613776, 0), x_dir=(0.823413639467006, -0.567441607867893, 0), z_dir=(-0.5674416078678929, -0.8234136394670059, 0)), mode=Mode.PRIVATE) as cut_extrude2_sk1:
        with Locations((15, 23.5)):
            Circle(SKETCH3_R)
    cut_extrude2_tool1 = extrude(cut_extrude2_sk1.sketch, amount=-CUT_EXTRUDE2_REACH, mode=Mode.PRIVATE) & part.part
    add(cut_extrude2_tool1.solids().sort_by_distance((-13.183668, -45.565238, 23.5))[0], mode=Mode.SUBTRACT)

    # Sketch3<3> → Cut-Extrude3 (cut)
    with BuildSketch(Plane(origin=(-25.534872354, -37.053613776, 0), x_dir=(0.823413639467006, -0.567441607867893, 0), z_dir=(-0.5674416078678929, -0.8234136394670059, 0))):
        with Locations((15, 23.5)):
            Circle(SKETCH3_3_R)
        with Locations((15, 23.5)):
            Circle(SKETCH3_3_R_2, mode=Mode.SUBTRACT)
    extrude(amount=-CUT_EXTRUDE3_DEPTH, mode=Mode.SUBTRACT)

    # Sketch4 → Cut-Extrude4 (cut)
    with BuildSketch(Plane.XY.offset(37)):
        with Locations((18.75, 32.475952642)):
            Circle(SKETCH4_R)
        with Locations((-28.726666617, 24.104535363)):
            Circle(SKETCH4_R)
        with Locations((-28.726666617, -24.104535363)):
            Circle(SKETCH4_R)
    cut_extrude4 = extrude(amount=-CUT_EXTRUDE4_DEPTH, mode=Mode.SUBTRACT)

    # Sketch5 → Boss-Extrude2 (add)
    with BuildSketch(Plane.XY.offset(37).offset(BOSS_EXTRUDE2_START)):
        with BuildLine():
            Line((-19.283628291, -22.981333294), (-21.854778729, -26.045511066))
            ThreePointArc((-21.854778729, -26.045511066), (-26.045511066, 21.854778729), (21.854778729, 26.045511066))
            Line((21.854778729, 26.045511066), (19.283628291, 22.981333294))
            ThreePointArc((19.283628291, 22.981333294), (-22.981333294, 19.283628291), (-19.283628291, -22.981333294))
        make_face()
    extrude(amount=BOSS_EXTRUDE2_DEPTH)

    # Fillet1
    # the kernel refuses this fillet: 10 mm, written as the material it takes off along each edge
    with BuildSketch(Plane(origin=(-19.283628291, -22.981333294, -6.269784336), x_dir=(-0.6427876096873701, -0.7660444431182809, 0), z_dir=(0, 0, 1))) as fillet1_piece_1:
        with BuildLine():
            CenterArc((9.058823529, -8.626024838), FILLET1_R, 120.389942449, 47.156356956)
            Line((-0.705882353, -6.469518628), (-0.901176471, -6.426388504))
            ThreePointArc((-0.901176471, -6.426388504), (-0.375812744, -3.232263822), (-0.2, 0))
            Line((-0.2, 0), (0, 0.2))
            ThreePointArc((0, 0.2), (2, 0.2), (3.898823529, 0.172520497))
            Line((3.898823529, 0.172520497), (4, 0))
        make_face()
    extrude(amount=59.539568673, mode=Mode.SUBTRACT)
    with BuildSketch(Plane(origin=(19.283628291, 22.981333294, -6.269784336), x_dir=(0.6427876096857099, 0.7660444431196739, 0), z_dir=(0, 0, 1))) as fillet1_piece_2:
        with BuildLine():
            CenterArc((9.058823529, 8.626024838), FILLET1_R, 192.453700594, 47.156356956)
            Line((-0.705882353, 6.469518628), (-0.901176471, 6.426388504))
            ThreePointArc((-0.901176471, 6.426388504), (-0.375812744, 3.232263822), (-0.2, 0))
            Line((-0.2, 0), (0, -0.2))
            ThreePointArc((0, -0.2), (2, -0.2), (3.898823529, -0.172520497))
            Line((3.898823529, -0.172520497), (4, 0))
        make_face()
    extrude(amount=59.539568673, mode=Mode.SUBTRACT)

    # Mirror1: Cut-Extrude4 across plane
    add(cut_extrude4.mirror(Plane.XY.offset(23.5)), mode=Mode.SUBTRACT)


solid = part.part
